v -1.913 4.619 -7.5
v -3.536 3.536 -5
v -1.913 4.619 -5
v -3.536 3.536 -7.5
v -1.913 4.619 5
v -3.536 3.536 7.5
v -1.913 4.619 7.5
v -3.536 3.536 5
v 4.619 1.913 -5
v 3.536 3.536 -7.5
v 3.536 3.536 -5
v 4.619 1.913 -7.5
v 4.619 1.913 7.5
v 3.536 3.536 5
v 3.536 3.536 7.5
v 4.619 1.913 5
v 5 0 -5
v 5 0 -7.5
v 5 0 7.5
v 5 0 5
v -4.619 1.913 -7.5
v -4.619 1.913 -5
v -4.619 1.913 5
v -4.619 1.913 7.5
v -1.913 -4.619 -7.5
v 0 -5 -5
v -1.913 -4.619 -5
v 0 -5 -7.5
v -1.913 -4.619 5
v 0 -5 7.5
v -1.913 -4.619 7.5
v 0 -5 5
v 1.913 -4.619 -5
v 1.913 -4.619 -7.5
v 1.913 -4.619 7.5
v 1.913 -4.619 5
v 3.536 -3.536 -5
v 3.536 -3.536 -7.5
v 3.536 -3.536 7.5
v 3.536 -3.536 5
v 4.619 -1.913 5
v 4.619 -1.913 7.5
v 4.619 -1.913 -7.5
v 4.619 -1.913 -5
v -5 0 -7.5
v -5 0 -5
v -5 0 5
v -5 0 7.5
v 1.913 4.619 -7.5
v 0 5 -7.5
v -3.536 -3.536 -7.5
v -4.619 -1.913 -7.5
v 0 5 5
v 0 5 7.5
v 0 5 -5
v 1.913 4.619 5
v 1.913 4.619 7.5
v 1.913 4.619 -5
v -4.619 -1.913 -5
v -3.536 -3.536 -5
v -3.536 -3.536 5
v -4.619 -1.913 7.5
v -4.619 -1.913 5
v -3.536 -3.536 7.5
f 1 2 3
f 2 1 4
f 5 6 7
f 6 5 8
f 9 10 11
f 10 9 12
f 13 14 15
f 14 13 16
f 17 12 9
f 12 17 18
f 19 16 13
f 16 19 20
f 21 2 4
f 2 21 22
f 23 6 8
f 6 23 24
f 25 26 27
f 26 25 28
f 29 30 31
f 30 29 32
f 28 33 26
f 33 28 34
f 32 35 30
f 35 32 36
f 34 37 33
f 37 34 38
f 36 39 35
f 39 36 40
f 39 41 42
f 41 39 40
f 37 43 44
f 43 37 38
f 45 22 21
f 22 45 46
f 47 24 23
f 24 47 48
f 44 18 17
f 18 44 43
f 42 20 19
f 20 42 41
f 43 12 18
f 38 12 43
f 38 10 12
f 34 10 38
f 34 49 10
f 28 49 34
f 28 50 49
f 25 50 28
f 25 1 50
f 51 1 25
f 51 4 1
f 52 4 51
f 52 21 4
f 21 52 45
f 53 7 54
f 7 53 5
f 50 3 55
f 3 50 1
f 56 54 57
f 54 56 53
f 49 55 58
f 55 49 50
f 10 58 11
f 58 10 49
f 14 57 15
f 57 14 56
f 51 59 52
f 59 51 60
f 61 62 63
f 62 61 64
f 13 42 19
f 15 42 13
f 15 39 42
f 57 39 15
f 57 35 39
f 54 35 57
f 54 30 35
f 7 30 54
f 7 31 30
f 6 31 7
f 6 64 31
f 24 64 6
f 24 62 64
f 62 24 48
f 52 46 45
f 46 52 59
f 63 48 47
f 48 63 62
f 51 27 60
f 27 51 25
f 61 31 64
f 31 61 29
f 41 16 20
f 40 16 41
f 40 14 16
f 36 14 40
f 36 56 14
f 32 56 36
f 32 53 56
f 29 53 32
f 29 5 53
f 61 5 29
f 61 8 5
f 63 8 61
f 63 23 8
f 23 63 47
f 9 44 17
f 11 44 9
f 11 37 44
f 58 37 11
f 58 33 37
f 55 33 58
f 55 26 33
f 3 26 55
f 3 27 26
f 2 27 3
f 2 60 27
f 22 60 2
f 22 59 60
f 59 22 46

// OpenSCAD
// Size of the cube (all directions)
cubSiz = 10;

//Diameter of the Cylinder
cyDia = 10;

//Height of the Cylinder
cyHei = 15;

// Or subtract Cube from Cylinder
// The order does matter with difference()
difference(){
    cylinder(d = cyDia, h = cyHei, center = true);
    cube(size = [cubSiz, cubSiz, cubSiz], center = true);
}
